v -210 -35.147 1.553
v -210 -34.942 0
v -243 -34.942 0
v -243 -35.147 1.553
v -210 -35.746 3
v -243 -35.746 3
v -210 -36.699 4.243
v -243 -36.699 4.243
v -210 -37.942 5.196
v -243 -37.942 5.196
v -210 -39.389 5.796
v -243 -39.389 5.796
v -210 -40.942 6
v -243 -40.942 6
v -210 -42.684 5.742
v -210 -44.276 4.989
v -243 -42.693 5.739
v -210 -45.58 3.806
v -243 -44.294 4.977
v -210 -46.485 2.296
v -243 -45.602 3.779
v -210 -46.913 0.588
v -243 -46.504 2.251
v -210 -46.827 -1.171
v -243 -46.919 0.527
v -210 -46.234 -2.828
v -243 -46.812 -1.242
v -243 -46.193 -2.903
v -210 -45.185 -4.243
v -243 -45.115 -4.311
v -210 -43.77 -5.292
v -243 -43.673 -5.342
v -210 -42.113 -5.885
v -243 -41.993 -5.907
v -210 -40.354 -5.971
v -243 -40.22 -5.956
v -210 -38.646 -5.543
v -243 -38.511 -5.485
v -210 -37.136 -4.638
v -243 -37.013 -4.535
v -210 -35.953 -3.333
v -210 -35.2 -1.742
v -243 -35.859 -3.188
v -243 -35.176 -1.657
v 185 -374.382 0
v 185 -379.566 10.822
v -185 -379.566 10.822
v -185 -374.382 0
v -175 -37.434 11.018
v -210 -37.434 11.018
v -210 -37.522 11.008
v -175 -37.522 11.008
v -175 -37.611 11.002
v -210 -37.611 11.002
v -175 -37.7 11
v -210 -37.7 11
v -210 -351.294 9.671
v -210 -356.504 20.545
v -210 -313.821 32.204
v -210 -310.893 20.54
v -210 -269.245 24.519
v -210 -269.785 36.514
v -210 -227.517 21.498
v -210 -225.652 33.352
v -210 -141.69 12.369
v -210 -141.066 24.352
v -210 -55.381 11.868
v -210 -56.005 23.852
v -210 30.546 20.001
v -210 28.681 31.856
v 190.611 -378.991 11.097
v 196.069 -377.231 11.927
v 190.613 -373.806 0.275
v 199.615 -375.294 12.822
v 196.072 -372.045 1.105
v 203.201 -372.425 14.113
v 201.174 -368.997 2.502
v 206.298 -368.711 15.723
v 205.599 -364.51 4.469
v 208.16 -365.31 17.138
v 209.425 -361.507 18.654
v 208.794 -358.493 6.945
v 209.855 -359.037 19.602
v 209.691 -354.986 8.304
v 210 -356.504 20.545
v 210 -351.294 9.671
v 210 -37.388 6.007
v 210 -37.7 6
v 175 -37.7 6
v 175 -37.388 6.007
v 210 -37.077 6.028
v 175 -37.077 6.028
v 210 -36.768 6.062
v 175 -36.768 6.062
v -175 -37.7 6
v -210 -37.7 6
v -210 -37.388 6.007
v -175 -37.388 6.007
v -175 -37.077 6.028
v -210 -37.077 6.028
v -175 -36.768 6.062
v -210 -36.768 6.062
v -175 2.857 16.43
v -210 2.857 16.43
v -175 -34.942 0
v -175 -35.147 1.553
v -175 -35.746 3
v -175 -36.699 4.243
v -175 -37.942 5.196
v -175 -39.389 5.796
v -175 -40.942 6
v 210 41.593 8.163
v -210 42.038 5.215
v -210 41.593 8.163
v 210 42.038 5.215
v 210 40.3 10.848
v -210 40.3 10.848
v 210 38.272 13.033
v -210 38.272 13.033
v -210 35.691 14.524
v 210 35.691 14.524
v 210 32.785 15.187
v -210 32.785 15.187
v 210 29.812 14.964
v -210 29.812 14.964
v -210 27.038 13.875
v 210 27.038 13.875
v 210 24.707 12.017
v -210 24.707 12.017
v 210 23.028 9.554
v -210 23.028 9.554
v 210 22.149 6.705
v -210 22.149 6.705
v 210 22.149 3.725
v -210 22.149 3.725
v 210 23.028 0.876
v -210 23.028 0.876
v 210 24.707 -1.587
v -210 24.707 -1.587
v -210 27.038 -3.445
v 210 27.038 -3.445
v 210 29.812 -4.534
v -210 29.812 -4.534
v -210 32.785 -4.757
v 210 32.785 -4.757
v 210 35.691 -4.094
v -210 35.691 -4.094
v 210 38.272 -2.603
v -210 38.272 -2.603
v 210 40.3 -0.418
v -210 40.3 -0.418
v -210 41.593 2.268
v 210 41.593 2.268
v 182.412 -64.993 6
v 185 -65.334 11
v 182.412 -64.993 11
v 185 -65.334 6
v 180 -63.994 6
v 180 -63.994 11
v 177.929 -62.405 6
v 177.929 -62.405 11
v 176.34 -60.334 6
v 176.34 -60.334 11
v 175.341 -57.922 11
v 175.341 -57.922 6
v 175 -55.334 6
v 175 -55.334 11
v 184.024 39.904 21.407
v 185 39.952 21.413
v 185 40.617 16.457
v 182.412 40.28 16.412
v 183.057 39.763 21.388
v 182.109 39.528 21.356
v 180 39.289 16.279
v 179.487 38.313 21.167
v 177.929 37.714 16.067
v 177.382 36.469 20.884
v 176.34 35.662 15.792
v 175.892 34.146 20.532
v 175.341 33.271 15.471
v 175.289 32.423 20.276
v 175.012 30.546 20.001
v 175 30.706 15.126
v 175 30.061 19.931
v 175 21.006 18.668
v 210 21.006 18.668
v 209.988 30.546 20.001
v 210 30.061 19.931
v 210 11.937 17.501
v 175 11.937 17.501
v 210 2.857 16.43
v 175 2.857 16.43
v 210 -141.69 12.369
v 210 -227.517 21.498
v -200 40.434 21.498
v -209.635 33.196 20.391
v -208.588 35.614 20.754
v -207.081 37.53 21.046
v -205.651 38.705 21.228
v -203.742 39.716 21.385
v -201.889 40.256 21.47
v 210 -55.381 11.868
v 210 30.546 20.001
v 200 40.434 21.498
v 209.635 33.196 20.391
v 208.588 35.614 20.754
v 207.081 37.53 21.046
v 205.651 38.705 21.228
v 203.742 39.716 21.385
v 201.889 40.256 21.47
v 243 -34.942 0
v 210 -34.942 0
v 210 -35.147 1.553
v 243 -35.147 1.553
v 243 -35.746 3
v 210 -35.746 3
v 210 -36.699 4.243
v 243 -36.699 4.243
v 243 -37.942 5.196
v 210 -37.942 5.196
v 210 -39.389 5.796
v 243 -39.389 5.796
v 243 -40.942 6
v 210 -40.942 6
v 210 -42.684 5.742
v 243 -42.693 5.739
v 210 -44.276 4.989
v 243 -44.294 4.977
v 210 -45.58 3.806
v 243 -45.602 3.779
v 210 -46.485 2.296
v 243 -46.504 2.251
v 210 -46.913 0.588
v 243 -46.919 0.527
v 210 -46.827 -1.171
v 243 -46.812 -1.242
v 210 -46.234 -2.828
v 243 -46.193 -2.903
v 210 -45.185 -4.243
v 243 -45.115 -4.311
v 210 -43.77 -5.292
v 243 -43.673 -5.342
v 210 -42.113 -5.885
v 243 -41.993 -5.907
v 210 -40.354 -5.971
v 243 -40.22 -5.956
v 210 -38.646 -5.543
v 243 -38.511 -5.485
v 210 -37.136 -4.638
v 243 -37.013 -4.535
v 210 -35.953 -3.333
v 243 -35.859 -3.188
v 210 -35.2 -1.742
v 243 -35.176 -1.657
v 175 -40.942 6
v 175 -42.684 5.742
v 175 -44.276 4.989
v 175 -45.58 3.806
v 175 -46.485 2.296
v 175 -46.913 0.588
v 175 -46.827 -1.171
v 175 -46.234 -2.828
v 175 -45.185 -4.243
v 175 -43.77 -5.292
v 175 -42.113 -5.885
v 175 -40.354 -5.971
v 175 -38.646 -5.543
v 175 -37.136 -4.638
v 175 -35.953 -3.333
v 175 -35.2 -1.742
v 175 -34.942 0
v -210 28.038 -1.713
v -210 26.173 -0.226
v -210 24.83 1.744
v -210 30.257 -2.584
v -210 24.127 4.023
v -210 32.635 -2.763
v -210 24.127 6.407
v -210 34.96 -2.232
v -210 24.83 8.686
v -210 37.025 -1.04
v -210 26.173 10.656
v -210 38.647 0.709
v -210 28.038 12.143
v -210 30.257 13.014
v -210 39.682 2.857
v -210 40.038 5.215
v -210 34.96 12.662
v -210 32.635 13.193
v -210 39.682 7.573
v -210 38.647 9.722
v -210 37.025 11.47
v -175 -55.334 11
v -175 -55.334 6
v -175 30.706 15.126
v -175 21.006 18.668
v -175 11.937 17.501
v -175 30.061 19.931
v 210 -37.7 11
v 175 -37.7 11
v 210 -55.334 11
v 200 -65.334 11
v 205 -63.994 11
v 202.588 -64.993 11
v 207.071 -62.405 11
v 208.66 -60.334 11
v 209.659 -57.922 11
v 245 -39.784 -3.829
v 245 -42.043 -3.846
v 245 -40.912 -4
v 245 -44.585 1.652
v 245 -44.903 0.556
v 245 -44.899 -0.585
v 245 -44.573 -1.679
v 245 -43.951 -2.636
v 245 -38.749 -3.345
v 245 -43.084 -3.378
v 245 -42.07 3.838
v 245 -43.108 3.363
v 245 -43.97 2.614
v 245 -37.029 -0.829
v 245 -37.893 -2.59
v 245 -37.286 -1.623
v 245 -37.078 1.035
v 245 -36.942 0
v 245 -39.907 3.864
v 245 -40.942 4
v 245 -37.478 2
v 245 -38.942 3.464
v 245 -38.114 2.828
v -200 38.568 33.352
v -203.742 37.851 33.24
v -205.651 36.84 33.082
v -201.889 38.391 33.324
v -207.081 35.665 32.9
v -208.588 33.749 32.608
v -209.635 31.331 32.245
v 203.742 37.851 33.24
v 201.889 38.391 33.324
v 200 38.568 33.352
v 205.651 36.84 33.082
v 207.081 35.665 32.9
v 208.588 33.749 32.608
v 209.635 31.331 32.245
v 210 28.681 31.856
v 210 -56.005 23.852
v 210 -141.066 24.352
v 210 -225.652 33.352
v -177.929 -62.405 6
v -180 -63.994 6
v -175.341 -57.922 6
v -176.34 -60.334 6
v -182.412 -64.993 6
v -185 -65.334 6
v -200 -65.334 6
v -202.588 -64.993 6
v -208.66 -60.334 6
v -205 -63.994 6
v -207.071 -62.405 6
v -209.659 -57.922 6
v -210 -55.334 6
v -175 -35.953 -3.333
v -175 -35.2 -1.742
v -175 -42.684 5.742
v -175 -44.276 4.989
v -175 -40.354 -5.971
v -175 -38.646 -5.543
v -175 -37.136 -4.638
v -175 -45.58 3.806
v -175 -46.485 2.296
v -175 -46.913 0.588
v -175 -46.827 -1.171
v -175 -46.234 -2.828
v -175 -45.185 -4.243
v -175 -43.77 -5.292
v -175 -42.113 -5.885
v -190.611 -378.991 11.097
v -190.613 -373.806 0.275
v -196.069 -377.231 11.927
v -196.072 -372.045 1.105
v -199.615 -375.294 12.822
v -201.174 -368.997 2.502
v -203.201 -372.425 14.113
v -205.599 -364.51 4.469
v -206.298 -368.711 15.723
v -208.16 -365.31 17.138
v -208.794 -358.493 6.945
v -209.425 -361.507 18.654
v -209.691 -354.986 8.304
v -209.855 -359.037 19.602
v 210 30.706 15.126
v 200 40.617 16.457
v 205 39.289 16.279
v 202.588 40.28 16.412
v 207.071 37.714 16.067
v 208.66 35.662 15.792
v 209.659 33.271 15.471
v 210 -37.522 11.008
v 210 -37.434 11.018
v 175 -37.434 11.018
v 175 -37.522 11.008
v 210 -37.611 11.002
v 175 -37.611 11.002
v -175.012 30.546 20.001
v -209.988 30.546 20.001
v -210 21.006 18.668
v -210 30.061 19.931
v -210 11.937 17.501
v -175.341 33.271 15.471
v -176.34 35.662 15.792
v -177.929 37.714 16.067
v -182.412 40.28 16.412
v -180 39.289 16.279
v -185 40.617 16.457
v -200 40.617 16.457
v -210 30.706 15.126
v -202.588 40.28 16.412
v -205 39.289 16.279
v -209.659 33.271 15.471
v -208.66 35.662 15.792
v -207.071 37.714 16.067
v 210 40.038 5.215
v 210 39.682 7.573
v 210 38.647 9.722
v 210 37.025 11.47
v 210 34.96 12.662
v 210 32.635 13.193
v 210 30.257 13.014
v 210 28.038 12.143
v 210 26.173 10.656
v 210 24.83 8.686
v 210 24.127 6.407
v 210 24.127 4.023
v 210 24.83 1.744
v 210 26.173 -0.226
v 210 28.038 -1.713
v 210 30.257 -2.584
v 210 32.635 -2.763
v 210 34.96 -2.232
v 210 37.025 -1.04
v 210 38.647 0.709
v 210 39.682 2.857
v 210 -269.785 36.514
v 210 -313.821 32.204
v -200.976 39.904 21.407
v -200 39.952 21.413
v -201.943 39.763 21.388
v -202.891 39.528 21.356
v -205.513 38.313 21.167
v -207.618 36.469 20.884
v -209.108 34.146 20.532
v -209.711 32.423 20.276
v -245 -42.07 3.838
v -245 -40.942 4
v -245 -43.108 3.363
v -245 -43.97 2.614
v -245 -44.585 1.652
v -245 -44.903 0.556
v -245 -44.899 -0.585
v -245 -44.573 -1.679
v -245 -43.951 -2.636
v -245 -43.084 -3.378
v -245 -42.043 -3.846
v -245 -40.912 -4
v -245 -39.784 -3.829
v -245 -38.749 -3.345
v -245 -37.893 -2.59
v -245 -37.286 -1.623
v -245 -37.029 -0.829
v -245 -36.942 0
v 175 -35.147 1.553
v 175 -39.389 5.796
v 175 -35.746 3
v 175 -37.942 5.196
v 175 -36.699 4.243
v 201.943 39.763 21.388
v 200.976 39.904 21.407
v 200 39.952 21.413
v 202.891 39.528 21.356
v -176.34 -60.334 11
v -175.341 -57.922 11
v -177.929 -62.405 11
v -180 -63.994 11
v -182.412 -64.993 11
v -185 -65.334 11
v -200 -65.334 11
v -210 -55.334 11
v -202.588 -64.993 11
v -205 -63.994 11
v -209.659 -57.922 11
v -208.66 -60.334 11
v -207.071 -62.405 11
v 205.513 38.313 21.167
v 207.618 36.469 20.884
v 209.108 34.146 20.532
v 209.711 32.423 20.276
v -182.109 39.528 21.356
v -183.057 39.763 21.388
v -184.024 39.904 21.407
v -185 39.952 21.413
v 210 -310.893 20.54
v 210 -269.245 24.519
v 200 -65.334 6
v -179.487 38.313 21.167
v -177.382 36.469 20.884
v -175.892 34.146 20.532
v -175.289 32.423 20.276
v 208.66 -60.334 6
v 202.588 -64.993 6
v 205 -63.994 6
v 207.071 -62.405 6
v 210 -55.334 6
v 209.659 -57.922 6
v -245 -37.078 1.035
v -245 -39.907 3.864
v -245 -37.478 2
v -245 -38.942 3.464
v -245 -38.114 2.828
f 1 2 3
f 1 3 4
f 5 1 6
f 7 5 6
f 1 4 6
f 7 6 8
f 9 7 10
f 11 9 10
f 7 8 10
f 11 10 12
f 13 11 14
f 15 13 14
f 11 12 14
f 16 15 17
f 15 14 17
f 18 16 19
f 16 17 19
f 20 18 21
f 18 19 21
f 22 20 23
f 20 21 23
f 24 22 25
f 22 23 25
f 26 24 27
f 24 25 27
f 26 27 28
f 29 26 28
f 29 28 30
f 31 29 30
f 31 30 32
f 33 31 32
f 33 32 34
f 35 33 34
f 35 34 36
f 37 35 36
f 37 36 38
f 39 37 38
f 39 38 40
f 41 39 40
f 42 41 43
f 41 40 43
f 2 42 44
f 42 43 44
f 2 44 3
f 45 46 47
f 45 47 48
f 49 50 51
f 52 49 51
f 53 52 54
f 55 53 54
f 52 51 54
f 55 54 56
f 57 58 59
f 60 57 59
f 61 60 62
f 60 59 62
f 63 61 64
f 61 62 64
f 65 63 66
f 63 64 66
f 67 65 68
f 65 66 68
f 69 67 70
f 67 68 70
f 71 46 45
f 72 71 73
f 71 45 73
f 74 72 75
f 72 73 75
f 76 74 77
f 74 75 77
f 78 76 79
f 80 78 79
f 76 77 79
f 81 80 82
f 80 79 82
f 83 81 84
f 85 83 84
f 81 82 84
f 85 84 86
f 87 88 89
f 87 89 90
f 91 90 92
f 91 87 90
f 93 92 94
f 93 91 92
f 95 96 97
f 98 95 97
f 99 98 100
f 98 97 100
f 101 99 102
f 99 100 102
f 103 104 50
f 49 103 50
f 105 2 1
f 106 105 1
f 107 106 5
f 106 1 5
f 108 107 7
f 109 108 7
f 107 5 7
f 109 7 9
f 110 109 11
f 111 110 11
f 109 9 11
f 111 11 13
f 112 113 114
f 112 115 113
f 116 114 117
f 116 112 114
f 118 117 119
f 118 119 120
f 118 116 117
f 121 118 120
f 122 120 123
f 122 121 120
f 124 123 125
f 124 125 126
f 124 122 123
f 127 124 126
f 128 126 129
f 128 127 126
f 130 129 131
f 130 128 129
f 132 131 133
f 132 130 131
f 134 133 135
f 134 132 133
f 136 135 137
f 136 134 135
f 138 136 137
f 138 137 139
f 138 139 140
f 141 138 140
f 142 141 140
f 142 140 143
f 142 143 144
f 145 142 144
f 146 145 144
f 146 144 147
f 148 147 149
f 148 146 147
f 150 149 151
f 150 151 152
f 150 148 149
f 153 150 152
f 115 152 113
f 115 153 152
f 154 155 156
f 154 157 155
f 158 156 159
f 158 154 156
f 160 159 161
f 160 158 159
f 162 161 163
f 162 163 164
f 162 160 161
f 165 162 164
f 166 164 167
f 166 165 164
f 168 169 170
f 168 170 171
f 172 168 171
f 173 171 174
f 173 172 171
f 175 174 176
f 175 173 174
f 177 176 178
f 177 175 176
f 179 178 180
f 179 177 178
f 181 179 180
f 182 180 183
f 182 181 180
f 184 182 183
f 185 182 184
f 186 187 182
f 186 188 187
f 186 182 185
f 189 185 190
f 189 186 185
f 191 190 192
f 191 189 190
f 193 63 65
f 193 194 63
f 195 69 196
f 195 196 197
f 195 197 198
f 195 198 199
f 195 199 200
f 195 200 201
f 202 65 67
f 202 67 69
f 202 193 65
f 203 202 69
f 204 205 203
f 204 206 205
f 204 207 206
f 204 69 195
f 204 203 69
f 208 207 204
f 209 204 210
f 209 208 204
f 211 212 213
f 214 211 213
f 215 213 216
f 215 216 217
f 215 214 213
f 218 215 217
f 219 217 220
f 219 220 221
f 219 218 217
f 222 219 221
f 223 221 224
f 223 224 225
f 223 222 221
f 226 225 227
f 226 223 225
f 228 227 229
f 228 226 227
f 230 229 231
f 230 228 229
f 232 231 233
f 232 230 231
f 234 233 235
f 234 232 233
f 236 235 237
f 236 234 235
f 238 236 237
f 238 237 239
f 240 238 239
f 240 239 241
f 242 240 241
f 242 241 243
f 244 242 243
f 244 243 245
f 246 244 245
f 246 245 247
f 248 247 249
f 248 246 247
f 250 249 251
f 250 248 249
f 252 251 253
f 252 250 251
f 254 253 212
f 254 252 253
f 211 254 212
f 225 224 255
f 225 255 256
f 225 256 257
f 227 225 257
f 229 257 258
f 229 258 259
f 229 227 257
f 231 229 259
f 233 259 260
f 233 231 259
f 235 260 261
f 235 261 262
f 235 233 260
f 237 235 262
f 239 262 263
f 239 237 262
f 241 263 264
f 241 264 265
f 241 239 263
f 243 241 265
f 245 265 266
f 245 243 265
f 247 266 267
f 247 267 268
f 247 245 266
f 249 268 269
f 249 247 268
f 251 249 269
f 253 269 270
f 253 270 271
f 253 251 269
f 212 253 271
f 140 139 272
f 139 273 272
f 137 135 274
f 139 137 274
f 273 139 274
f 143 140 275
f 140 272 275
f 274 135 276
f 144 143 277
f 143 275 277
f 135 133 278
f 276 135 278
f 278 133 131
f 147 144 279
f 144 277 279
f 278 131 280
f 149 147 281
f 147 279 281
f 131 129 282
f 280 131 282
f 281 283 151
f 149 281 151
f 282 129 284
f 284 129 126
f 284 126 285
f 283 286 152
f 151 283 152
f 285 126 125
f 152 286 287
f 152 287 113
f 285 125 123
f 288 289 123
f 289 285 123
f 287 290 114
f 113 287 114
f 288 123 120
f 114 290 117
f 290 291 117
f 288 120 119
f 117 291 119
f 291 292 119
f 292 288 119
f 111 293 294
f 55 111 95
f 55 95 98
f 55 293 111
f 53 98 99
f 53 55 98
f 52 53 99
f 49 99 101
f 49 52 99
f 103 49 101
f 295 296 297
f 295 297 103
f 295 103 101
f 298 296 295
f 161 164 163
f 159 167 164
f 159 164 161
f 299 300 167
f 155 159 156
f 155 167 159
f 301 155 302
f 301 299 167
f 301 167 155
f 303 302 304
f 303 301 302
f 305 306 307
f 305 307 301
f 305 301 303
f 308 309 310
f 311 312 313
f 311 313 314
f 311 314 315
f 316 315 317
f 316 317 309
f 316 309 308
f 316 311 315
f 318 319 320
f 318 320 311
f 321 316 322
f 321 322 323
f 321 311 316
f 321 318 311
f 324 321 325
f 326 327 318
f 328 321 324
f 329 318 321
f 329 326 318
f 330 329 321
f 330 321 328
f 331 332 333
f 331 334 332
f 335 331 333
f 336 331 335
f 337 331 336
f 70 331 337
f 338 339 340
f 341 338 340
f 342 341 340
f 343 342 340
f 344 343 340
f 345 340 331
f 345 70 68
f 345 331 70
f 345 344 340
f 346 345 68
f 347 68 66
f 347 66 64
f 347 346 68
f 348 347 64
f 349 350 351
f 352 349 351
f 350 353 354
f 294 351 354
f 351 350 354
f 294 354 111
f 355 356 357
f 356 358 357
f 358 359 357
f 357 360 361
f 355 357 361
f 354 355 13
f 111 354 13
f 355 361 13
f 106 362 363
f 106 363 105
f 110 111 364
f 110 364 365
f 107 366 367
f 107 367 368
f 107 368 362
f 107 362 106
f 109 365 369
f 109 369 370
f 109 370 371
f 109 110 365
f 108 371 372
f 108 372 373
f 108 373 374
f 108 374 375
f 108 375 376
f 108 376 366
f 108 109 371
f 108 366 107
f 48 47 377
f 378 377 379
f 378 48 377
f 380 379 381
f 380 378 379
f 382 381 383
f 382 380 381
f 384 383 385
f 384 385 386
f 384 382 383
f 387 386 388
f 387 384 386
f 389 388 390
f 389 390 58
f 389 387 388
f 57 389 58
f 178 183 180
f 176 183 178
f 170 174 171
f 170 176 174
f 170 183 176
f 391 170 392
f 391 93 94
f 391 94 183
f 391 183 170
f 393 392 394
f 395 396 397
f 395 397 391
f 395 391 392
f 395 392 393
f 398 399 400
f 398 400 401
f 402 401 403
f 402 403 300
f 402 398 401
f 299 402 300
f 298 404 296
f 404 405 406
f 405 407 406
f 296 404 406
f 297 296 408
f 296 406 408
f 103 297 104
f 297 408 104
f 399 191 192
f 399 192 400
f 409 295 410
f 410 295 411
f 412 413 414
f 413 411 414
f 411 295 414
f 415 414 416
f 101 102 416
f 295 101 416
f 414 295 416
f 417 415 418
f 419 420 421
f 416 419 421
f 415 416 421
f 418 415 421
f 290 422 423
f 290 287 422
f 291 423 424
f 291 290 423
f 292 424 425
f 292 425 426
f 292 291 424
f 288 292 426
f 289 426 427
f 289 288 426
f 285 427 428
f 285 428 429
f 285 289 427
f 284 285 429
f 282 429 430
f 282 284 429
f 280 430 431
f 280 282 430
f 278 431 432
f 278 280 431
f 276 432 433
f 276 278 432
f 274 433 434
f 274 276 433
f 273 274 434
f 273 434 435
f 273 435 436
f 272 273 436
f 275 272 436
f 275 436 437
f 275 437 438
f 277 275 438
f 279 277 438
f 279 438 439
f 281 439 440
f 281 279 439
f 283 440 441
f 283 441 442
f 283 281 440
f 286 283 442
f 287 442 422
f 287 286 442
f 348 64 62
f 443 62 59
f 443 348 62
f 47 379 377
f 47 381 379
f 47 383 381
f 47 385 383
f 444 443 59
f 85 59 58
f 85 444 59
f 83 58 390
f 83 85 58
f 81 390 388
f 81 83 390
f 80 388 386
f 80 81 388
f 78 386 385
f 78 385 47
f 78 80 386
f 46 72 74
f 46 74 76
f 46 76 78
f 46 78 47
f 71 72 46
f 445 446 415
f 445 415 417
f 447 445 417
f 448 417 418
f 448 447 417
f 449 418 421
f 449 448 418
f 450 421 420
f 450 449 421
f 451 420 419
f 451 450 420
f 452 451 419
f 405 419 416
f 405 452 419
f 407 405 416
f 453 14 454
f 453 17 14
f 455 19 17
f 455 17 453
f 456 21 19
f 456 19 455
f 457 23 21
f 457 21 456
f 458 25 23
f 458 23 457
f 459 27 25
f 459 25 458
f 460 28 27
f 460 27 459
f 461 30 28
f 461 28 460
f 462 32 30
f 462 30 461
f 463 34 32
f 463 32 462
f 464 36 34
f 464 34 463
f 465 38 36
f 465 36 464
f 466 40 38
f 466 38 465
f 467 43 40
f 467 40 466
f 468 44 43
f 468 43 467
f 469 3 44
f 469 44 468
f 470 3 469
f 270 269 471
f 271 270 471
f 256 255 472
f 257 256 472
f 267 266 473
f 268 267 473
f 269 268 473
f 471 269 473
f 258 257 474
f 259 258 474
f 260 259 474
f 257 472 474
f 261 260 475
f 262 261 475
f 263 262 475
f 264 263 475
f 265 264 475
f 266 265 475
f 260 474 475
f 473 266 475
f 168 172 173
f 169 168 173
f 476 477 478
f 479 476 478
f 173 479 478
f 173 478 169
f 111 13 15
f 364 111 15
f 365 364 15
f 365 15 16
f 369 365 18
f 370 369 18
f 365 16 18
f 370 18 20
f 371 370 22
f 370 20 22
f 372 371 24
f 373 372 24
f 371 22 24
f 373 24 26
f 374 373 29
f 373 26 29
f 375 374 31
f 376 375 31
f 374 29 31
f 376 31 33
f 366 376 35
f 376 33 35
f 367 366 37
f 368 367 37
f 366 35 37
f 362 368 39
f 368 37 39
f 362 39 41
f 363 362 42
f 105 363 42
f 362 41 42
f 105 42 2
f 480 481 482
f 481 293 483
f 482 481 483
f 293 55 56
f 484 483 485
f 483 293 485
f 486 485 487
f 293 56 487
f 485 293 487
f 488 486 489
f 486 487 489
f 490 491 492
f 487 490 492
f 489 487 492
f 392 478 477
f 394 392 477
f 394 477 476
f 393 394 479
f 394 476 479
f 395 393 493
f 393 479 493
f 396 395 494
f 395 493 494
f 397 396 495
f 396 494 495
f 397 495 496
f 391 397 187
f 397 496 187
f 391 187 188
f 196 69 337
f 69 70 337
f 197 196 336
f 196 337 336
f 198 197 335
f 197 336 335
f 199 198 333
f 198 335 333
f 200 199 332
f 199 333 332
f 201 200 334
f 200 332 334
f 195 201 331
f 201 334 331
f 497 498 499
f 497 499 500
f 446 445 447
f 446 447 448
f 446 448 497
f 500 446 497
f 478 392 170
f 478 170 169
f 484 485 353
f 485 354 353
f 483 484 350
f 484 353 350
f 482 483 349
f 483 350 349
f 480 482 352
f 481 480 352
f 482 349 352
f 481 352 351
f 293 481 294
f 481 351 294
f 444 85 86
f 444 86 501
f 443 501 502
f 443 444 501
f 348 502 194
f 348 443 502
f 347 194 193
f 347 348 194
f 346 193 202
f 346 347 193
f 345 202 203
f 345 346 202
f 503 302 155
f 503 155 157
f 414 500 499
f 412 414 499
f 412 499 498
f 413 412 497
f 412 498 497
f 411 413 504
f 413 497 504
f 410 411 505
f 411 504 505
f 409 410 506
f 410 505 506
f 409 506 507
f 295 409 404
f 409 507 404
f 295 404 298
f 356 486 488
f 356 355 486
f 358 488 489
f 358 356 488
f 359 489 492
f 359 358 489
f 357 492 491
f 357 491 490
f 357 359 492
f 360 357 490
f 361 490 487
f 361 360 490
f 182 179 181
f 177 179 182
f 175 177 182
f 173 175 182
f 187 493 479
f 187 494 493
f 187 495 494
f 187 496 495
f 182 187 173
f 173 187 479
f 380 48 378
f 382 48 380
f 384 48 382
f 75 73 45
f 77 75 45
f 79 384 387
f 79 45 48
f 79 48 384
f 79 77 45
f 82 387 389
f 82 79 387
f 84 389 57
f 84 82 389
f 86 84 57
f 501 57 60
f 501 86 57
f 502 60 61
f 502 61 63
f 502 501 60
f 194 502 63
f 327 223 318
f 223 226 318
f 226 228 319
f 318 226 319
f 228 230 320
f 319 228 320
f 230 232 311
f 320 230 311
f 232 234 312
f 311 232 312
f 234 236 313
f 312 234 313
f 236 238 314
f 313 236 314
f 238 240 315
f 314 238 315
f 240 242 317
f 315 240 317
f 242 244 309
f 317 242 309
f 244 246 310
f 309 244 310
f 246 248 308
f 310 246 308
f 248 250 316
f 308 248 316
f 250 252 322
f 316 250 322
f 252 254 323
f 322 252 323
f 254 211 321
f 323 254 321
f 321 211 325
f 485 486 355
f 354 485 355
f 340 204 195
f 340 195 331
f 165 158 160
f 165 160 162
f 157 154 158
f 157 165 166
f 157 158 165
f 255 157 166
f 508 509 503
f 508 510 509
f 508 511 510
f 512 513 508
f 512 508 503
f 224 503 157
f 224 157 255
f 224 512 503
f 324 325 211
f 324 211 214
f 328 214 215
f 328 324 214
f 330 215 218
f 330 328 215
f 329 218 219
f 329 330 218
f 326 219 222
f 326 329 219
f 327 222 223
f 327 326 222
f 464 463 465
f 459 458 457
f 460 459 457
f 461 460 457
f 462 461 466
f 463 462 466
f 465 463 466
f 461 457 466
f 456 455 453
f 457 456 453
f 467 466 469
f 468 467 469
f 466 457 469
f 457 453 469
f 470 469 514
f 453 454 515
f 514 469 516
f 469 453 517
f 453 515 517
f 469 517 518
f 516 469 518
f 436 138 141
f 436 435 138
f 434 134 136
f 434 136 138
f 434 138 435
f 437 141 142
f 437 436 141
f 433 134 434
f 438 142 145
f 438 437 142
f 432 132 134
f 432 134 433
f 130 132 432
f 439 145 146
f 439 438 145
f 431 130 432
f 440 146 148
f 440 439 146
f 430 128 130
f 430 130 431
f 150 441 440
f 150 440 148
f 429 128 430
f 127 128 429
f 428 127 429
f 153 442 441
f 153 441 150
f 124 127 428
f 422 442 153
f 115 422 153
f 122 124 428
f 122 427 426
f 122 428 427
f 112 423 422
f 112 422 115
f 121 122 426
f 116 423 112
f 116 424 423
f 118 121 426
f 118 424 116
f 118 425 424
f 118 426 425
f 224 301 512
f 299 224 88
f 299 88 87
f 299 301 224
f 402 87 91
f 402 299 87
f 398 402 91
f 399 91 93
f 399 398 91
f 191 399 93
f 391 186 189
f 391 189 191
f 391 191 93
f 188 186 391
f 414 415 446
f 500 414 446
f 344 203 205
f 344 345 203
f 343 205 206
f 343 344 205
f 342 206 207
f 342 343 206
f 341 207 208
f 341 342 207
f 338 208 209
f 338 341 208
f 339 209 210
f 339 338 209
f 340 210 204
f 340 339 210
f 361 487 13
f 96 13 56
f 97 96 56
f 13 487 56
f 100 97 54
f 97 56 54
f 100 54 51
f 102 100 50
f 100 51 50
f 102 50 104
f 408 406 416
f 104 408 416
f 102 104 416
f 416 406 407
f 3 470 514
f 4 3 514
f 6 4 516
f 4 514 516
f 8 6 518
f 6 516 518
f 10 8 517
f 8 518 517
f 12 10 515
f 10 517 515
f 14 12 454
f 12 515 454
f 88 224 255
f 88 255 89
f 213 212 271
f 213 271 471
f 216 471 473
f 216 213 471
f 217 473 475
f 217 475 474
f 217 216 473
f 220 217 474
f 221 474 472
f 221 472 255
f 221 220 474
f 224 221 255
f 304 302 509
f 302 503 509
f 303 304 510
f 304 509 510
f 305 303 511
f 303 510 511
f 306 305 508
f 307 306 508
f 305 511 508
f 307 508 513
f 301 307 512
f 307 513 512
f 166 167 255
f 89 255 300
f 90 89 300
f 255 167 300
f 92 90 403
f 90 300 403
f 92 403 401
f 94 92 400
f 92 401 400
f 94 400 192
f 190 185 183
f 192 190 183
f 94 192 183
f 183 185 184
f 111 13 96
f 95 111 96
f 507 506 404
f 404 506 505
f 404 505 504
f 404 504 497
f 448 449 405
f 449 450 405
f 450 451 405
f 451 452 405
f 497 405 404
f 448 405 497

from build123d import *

# Parameters (mm, degrees)
F1_DEPTH  = 210
F3_R      = 25
F4_R      = 10
F5_R      = 10
F5_R_2    = 8
F6_DEPTH  = 210
F8_DEPTH  = 35
F9_R      = 10
F10_DEPTH = 35
F11_SIZE  = 2


with BuildPart() as f1:
    # F0 (on Right) → F1 (new body, symmetric)
    with BuildSketch(Plane.YZ):
        with BuildLine():
            ThreePointArc((-374.3819809216, 0), (-302.5817039416, 21.8999198492), (-227.5169006722, 21.4979572801))
            ThreePointArc((-227.5169006722, 21.4979572801), (-93.5416604475, 11.0228453525), (40.4335797772, 21.4979572801))
            Line((40.4335797772, 21.4979572801), (38.5684952265, 33.352132056))
            ThreePointArc((38.5684952265, 33.352132056), (-93.5416604475, 23.0228453525), (-225.6518161215, 33.352132056))
            ThreePointArc((-225.6518161215, 33.352132056), (-304.3197299479, 33.7733888284), (-379.5664202228, 10.8222728265))
            Line((-379.5664202228, 10.8222728265), (-374.3819809216, 0))
        make_face()
    extrude(amount=F1_DEPTH, both=True)

    # F3
    f3_edges = [f1.edges().sort_by_distance(p)[0] for p in [
        (210, -376.974201, 5.411136),
        (-210, -376.974201, 5.411136),
    ]]
    fillet(f3_edges, radius=F3_R)

    # F4
    f4_edges = [f1.edges().sort_by_distance(p)[0] for p in [
        (210, 39.501038, 27.425045),
        (-210, 39.501038, 27.425045),
    ]]
    fillet(f4_edges, radius=F4_R)


with BuildPart() as f6:
    # F5 (on Right) → F6 (new body, symmetric)
    with BuildSketch(Plane.YZ):
        with Locations((32.0375707172, 5.2150675053)):
            Circle(F5_R)
        with Locations((32.0375707172, 5.2150675053)):
            Circle(F5_R_2, mode=Mode.SUBTRACT)
    extrude(amount=F6_DEPTH, both=True)


with BuildPart() as f8:
    # F7 (on face) → F8 (new body)
    with BuildSketch(Plane.YZ.offset(210)):
        with BuildLine():
            Line((40.6172181352, 16.4573826665), (39.9515511994, 21.4128733113))
            Line((39.9515511994, 21.4128733113), (39.528336846, 21.3560232793))
            ThreePointArc((39.528336846, 21.3560232793), (35.038995934, 20.6666904474), (30.5460851973, 20.0010218445))
            ThreePointArc((30.5460851973, 20.0010218445), (16.7162180368, 18.10343381), (2.8574353356, 16.4300515863))
            Line((2.8574353356, 16.4300515863), (-37.4335001414, 11.0178037421))
            ThreePointArc((-37.4335001414, 11.0178037421), (-37.5663362518, 11.0044558993), (-37.6997669157, 11))
            Line((-37.6997669157, 11), (-65.3339400887, 11))
            Line((-65.3339400887, 11), (-65.3339400887, 6))
            Line((-65.3339400887, 6), (-40.9420840442, 6))
            Line((-40.9420840442, 6), (-37.6997669157, 6))
            ThreePointArc((-37.6997669157, 6), (-37.2327595919, 6.0155956475), (-36.7678332056, 6.0623130973))
            Line((-36.7678332056, 6.0623130973), (40.6172181352, 16.4573826665))
        make_face()
    extrude(amount=-F8_DEPTH)

    # F9
    f9_edges = [f8.edges().sort_by_distance(p)[0] for p in [
        (210, -65.33394, 8.5),
        (175, -65.33394, 8.5),
        (210, 40.284385, 18.935128),
        (175, 40.284385, 18.935128),
    ]]
    fillet(f9_edges, radius=F9_R)

    # F7 (on face) → F10 (join, symmetric)
    with BuildSketch(Plane.YZ.offset(210)):
        with BuildLine():
            ThreePointArc((-34.9420840442, 0), (-36.6994433571, 4.2426406871), (-40.9420840442, 6))
            ThreePointArc((-40.9420840442, 6), (-45.1847247313, -4.2426406871), (-34.9420840442, 0))
        make_face()
    extrude(amount=F10_DEPTH, both=True)

    # F11
    f11_edges = [f8.edges().sort_by_distance(p)[0] for p in [
        (245, -45.184725, -4.242641),
        (245, -36.699443, 4.242641),
    ]]
    chamfer(f11_edges, length=F11_SIZE)


with BuildPart() as f12_1:
    # F12: instance of F8
    add(f8.part.mirror(Plane.YZ))


solid = Compound([f1.part, f6.part, f8.part, f12_1.part])
